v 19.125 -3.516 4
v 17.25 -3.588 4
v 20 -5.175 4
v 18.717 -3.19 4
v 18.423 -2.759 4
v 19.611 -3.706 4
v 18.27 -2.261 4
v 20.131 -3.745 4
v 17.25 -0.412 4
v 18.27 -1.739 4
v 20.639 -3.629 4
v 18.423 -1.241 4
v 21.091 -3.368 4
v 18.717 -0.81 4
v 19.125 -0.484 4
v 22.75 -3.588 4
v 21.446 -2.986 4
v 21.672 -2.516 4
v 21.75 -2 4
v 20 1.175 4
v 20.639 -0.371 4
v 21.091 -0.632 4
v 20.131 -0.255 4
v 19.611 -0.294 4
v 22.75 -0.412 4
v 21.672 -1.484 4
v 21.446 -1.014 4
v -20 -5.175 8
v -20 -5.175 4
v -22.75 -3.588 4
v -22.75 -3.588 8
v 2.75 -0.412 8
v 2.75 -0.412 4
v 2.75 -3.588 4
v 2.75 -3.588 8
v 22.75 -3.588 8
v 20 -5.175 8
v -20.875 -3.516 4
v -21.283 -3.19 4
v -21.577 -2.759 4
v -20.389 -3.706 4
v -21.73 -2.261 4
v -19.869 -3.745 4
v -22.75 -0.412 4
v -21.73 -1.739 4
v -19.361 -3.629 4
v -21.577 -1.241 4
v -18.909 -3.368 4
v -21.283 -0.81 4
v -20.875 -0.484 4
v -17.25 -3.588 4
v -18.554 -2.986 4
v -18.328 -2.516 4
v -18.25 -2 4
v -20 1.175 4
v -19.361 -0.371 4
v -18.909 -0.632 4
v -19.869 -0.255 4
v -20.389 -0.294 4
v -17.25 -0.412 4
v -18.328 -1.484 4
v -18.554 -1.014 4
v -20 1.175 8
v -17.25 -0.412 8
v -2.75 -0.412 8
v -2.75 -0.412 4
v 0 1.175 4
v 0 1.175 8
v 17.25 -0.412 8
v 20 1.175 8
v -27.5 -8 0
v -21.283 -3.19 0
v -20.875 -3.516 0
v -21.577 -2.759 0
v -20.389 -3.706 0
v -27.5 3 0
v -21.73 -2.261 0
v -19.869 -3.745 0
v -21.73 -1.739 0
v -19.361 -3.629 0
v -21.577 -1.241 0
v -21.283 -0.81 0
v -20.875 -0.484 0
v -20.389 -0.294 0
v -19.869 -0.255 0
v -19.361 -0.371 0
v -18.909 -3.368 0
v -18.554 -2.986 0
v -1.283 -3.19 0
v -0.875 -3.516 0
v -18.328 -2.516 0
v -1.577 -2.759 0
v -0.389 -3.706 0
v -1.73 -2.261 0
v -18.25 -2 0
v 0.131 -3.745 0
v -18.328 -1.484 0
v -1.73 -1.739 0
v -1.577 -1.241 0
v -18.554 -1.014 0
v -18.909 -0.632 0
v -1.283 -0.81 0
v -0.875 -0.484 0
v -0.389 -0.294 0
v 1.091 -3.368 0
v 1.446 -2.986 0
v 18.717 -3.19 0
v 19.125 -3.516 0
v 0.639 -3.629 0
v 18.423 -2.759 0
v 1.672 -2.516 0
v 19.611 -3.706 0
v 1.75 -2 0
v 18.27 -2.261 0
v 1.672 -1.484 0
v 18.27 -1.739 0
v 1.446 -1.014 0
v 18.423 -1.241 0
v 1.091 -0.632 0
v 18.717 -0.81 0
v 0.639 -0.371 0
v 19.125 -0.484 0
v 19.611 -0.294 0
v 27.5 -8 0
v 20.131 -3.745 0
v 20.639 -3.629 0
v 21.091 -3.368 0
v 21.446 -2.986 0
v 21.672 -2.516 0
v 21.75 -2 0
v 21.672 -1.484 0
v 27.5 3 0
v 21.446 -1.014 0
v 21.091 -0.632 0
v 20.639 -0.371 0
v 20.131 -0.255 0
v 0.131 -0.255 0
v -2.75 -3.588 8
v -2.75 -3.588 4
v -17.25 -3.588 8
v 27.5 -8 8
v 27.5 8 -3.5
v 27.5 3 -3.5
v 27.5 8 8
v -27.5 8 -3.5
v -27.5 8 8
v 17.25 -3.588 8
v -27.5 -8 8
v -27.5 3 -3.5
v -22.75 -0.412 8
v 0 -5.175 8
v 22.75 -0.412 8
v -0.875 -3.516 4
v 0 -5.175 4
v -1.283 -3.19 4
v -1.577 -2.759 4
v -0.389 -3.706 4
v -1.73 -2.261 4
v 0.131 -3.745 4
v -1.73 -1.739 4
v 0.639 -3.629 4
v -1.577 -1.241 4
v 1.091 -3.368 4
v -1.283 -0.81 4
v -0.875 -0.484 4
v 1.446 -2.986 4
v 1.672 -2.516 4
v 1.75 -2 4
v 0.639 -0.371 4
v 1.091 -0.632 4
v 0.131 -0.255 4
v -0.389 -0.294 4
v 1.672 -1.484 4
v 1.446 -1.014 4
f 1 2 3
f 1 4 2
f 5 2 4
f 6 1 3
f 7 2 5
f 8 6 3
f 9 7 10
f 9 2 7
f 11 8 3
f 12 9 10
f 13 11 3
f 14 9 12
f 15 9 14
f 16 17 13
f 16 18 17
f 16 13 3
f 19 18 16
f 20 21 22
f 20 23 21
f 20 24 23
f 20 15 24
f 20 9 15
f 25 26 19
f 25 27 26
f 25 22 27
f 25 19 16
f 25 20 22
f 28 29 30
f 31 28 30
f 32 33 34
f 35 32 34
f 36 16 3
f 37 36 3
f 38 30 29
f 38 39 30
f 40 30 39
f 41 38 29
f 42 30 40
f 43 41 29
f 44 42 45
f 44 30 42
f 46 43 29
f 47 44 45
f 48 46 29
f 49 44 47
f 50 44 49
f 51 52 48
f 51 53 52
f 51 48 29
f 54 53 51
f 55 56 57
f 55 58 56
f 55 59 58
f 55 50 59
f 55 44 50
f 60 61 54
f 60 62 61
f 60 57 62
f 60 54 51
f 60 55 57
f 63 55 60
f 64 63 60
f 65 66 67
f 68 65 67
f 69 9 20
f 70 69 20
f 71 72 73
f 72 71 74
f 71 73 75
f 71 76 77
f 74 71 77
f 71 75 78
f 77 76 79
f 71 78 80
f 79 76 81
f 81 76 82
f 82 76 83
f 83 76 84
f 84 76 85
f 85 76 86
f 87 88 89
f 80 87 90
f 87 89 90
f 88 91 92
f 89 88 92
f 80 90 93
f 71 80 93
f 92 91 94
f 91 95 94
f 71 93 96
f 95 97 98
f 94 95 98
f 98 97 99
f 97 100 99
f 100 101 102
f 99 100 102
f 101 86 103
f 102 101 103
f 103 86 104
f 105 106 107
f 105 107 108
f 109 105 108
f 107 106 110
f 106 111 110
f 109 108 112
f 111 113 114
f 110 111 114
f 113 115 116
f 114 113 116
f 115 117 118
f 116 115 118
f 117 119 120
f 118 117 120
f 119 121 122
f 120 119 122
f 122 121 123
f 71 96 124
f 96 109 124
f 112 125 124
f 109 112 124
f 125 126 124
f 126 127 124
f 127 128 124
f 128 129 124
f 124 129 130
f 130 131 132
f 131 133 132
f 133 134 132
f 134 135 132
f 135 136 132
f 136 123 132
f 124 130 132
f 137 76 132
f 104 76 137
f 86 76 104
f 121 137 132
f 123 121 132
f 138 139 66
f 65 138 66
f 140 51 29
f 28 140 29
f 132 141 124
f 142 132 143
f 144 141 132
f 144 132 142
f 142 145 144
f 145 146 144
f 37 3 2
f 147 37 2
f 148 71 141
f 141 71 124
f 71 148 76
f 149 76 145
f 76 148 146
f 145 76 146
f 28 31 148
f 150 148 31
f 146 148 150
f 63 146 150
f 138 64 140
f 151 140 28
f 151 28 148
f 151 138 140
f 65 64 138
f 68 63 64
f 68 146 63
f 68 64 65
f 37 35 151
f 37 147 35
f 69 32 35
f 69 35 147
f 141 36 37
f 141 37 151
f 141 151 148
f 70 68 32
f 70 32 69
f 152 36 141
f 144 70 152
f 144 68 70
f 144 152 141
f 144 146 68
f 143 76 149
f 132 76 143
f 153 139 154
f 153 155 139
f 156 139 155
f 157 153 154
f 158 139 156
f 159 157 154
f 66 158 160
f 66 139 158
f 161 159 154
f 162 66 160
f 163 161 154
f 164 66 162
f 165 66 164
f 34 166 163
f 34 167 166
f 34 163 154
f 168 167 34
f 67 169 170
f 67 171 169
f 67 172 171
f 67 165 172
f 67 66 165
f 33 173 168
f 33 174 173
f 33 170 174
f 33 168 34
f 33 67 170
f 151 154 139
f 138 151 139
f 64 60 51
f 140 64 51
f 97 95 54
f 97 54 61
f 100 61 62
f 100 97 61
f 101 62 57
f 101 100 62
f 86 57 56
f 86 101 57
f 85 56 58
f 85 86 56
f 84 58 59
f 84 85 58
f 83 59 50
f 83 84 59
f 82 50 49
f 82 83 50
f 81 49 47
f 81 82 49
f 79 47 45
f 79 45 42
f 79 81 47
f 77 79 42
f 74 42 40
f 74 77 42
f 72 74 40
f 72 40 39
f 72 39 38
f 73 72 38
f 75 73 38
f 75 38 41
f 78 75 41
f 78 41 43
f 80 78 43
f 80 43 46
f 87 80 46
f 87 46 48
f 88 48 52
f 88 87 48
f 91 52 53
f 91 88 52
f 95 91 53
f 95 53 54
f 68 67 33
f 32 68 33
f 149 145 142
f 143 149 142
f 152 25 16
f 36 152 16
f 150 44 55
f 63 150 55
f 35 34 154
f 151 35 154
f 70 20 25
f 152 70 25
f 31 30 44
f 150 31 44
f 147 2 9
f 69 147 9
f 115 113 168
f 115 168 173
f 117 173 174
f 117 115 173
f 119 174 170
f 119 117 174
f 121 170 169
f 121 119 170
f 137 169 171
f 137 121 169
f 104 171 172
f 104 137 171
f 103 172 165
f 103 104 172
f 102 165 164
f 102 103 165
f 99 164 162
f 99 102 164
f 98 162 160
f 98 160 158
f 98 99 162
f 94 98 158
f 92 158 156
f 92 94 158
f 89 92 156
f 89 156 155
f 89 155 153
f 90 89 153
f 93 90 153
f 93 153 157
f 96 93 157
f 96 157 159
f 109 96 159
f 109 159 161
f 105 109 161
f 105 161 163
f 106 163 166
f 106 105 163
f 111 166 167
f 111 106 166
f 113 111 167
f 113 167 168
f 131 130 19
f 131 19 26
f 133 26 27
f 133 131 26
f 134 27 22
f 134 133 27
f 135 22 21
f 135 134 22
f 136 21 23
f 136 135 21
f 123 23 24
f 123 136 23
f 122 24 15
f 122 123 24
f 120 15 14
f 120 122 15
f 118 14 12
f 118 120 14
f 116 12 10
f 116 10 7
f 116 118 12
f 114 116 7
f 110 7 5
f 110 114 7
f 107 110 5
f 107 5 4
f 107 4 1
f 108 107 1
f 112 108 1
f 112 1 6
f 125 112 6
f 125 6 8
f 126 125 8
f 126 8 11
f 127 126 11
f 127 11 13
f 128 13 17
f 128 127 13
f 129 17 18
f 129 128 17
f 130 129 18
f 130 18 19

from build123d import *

# Parameters (mm, degrees)
F0_W     = 55
F0_H     = 5
F0_H_2   = 11
F1_DEPTH = 8
F0_R     = 1.75
F2_DEPTH = 4
F3_DEPTH = 3.5


with BuildPart() as f1:
    # F0 (on Top) → F1 (new body)
    with BuildSketch(Plane.XY):
        with Locations((0, 5.5)):
            Rectangle(F0_W, F0_H)
        with Locations((0, -2.5)):
            Rectangle(F0_W, F0_H_2)
        Polygon((-20, -5.175426), (-22.75, -3.587713), (-22.75, -0.412287), (-20, 1.175426), (-17.25, -0.412287), (-17.25, -3.587713), align=None, mode=Mode.SUBTRACT)
        Polygon((0, -5.175426), (-2.75, -3.587713), (-2.75, -0.412287), (0, 1.175426), (2.75, -0.412287), (2.75, -3.587713), align=None, mode=Mode.SUBTRACT)
        Polygon((20, 1.175426), (22.75, -0.412287), (22.75, -3.587713), (20, -5.175426), (17.25, -3.587713), (17.25, -0.412287), align=None, mode=Mode.SUBTRACT)
    extrude(amount=F1_DEPTH)

    # F0 (on Top) → F2 (join)
    with BuildSketch(Plane.XY):
        Polygon((-22.75, -0.412287), (-22.75, -3.587713), (-20, -5.175426), (-17.25, -3.587713), (-17.25, -0.412287), (-20, 1.175426), align=None)
        with Locations((-20, -2)):
            Circle(F0_R, mode=Mode.SUBTRACT)
        Polygon((-2.75, -0.412287), (-2.75, -3.587713), (0, -5.175426), (2.75, -3.587713), (2.75, -0.412287), (0, 1.175426), align=None)
        with Locations((0, -2)):
            Circle(F0_R, mode=Mode.SUBTRACT)
        Polygon((22.75, -3.587713), (22.75, -0.412287), (20, 1.175426), (17.25, -0.412287), (17.25, -3.587713), (20, -5.175426), align=None)
        with Locations((20, -2)):
            Circle(F0_R, mode=Mode.SUBTRACT)
    extrude(amount=F2_DEPTH)

    # F0 (on Top) → F3 (join)
    with BuildSketch(Plane.XY):
        with Locations((0, 5.5)):
            Rectangle(F0_W, F0_H)
    extrude(amount=-F3_DEPTH)


solid = f1.part
